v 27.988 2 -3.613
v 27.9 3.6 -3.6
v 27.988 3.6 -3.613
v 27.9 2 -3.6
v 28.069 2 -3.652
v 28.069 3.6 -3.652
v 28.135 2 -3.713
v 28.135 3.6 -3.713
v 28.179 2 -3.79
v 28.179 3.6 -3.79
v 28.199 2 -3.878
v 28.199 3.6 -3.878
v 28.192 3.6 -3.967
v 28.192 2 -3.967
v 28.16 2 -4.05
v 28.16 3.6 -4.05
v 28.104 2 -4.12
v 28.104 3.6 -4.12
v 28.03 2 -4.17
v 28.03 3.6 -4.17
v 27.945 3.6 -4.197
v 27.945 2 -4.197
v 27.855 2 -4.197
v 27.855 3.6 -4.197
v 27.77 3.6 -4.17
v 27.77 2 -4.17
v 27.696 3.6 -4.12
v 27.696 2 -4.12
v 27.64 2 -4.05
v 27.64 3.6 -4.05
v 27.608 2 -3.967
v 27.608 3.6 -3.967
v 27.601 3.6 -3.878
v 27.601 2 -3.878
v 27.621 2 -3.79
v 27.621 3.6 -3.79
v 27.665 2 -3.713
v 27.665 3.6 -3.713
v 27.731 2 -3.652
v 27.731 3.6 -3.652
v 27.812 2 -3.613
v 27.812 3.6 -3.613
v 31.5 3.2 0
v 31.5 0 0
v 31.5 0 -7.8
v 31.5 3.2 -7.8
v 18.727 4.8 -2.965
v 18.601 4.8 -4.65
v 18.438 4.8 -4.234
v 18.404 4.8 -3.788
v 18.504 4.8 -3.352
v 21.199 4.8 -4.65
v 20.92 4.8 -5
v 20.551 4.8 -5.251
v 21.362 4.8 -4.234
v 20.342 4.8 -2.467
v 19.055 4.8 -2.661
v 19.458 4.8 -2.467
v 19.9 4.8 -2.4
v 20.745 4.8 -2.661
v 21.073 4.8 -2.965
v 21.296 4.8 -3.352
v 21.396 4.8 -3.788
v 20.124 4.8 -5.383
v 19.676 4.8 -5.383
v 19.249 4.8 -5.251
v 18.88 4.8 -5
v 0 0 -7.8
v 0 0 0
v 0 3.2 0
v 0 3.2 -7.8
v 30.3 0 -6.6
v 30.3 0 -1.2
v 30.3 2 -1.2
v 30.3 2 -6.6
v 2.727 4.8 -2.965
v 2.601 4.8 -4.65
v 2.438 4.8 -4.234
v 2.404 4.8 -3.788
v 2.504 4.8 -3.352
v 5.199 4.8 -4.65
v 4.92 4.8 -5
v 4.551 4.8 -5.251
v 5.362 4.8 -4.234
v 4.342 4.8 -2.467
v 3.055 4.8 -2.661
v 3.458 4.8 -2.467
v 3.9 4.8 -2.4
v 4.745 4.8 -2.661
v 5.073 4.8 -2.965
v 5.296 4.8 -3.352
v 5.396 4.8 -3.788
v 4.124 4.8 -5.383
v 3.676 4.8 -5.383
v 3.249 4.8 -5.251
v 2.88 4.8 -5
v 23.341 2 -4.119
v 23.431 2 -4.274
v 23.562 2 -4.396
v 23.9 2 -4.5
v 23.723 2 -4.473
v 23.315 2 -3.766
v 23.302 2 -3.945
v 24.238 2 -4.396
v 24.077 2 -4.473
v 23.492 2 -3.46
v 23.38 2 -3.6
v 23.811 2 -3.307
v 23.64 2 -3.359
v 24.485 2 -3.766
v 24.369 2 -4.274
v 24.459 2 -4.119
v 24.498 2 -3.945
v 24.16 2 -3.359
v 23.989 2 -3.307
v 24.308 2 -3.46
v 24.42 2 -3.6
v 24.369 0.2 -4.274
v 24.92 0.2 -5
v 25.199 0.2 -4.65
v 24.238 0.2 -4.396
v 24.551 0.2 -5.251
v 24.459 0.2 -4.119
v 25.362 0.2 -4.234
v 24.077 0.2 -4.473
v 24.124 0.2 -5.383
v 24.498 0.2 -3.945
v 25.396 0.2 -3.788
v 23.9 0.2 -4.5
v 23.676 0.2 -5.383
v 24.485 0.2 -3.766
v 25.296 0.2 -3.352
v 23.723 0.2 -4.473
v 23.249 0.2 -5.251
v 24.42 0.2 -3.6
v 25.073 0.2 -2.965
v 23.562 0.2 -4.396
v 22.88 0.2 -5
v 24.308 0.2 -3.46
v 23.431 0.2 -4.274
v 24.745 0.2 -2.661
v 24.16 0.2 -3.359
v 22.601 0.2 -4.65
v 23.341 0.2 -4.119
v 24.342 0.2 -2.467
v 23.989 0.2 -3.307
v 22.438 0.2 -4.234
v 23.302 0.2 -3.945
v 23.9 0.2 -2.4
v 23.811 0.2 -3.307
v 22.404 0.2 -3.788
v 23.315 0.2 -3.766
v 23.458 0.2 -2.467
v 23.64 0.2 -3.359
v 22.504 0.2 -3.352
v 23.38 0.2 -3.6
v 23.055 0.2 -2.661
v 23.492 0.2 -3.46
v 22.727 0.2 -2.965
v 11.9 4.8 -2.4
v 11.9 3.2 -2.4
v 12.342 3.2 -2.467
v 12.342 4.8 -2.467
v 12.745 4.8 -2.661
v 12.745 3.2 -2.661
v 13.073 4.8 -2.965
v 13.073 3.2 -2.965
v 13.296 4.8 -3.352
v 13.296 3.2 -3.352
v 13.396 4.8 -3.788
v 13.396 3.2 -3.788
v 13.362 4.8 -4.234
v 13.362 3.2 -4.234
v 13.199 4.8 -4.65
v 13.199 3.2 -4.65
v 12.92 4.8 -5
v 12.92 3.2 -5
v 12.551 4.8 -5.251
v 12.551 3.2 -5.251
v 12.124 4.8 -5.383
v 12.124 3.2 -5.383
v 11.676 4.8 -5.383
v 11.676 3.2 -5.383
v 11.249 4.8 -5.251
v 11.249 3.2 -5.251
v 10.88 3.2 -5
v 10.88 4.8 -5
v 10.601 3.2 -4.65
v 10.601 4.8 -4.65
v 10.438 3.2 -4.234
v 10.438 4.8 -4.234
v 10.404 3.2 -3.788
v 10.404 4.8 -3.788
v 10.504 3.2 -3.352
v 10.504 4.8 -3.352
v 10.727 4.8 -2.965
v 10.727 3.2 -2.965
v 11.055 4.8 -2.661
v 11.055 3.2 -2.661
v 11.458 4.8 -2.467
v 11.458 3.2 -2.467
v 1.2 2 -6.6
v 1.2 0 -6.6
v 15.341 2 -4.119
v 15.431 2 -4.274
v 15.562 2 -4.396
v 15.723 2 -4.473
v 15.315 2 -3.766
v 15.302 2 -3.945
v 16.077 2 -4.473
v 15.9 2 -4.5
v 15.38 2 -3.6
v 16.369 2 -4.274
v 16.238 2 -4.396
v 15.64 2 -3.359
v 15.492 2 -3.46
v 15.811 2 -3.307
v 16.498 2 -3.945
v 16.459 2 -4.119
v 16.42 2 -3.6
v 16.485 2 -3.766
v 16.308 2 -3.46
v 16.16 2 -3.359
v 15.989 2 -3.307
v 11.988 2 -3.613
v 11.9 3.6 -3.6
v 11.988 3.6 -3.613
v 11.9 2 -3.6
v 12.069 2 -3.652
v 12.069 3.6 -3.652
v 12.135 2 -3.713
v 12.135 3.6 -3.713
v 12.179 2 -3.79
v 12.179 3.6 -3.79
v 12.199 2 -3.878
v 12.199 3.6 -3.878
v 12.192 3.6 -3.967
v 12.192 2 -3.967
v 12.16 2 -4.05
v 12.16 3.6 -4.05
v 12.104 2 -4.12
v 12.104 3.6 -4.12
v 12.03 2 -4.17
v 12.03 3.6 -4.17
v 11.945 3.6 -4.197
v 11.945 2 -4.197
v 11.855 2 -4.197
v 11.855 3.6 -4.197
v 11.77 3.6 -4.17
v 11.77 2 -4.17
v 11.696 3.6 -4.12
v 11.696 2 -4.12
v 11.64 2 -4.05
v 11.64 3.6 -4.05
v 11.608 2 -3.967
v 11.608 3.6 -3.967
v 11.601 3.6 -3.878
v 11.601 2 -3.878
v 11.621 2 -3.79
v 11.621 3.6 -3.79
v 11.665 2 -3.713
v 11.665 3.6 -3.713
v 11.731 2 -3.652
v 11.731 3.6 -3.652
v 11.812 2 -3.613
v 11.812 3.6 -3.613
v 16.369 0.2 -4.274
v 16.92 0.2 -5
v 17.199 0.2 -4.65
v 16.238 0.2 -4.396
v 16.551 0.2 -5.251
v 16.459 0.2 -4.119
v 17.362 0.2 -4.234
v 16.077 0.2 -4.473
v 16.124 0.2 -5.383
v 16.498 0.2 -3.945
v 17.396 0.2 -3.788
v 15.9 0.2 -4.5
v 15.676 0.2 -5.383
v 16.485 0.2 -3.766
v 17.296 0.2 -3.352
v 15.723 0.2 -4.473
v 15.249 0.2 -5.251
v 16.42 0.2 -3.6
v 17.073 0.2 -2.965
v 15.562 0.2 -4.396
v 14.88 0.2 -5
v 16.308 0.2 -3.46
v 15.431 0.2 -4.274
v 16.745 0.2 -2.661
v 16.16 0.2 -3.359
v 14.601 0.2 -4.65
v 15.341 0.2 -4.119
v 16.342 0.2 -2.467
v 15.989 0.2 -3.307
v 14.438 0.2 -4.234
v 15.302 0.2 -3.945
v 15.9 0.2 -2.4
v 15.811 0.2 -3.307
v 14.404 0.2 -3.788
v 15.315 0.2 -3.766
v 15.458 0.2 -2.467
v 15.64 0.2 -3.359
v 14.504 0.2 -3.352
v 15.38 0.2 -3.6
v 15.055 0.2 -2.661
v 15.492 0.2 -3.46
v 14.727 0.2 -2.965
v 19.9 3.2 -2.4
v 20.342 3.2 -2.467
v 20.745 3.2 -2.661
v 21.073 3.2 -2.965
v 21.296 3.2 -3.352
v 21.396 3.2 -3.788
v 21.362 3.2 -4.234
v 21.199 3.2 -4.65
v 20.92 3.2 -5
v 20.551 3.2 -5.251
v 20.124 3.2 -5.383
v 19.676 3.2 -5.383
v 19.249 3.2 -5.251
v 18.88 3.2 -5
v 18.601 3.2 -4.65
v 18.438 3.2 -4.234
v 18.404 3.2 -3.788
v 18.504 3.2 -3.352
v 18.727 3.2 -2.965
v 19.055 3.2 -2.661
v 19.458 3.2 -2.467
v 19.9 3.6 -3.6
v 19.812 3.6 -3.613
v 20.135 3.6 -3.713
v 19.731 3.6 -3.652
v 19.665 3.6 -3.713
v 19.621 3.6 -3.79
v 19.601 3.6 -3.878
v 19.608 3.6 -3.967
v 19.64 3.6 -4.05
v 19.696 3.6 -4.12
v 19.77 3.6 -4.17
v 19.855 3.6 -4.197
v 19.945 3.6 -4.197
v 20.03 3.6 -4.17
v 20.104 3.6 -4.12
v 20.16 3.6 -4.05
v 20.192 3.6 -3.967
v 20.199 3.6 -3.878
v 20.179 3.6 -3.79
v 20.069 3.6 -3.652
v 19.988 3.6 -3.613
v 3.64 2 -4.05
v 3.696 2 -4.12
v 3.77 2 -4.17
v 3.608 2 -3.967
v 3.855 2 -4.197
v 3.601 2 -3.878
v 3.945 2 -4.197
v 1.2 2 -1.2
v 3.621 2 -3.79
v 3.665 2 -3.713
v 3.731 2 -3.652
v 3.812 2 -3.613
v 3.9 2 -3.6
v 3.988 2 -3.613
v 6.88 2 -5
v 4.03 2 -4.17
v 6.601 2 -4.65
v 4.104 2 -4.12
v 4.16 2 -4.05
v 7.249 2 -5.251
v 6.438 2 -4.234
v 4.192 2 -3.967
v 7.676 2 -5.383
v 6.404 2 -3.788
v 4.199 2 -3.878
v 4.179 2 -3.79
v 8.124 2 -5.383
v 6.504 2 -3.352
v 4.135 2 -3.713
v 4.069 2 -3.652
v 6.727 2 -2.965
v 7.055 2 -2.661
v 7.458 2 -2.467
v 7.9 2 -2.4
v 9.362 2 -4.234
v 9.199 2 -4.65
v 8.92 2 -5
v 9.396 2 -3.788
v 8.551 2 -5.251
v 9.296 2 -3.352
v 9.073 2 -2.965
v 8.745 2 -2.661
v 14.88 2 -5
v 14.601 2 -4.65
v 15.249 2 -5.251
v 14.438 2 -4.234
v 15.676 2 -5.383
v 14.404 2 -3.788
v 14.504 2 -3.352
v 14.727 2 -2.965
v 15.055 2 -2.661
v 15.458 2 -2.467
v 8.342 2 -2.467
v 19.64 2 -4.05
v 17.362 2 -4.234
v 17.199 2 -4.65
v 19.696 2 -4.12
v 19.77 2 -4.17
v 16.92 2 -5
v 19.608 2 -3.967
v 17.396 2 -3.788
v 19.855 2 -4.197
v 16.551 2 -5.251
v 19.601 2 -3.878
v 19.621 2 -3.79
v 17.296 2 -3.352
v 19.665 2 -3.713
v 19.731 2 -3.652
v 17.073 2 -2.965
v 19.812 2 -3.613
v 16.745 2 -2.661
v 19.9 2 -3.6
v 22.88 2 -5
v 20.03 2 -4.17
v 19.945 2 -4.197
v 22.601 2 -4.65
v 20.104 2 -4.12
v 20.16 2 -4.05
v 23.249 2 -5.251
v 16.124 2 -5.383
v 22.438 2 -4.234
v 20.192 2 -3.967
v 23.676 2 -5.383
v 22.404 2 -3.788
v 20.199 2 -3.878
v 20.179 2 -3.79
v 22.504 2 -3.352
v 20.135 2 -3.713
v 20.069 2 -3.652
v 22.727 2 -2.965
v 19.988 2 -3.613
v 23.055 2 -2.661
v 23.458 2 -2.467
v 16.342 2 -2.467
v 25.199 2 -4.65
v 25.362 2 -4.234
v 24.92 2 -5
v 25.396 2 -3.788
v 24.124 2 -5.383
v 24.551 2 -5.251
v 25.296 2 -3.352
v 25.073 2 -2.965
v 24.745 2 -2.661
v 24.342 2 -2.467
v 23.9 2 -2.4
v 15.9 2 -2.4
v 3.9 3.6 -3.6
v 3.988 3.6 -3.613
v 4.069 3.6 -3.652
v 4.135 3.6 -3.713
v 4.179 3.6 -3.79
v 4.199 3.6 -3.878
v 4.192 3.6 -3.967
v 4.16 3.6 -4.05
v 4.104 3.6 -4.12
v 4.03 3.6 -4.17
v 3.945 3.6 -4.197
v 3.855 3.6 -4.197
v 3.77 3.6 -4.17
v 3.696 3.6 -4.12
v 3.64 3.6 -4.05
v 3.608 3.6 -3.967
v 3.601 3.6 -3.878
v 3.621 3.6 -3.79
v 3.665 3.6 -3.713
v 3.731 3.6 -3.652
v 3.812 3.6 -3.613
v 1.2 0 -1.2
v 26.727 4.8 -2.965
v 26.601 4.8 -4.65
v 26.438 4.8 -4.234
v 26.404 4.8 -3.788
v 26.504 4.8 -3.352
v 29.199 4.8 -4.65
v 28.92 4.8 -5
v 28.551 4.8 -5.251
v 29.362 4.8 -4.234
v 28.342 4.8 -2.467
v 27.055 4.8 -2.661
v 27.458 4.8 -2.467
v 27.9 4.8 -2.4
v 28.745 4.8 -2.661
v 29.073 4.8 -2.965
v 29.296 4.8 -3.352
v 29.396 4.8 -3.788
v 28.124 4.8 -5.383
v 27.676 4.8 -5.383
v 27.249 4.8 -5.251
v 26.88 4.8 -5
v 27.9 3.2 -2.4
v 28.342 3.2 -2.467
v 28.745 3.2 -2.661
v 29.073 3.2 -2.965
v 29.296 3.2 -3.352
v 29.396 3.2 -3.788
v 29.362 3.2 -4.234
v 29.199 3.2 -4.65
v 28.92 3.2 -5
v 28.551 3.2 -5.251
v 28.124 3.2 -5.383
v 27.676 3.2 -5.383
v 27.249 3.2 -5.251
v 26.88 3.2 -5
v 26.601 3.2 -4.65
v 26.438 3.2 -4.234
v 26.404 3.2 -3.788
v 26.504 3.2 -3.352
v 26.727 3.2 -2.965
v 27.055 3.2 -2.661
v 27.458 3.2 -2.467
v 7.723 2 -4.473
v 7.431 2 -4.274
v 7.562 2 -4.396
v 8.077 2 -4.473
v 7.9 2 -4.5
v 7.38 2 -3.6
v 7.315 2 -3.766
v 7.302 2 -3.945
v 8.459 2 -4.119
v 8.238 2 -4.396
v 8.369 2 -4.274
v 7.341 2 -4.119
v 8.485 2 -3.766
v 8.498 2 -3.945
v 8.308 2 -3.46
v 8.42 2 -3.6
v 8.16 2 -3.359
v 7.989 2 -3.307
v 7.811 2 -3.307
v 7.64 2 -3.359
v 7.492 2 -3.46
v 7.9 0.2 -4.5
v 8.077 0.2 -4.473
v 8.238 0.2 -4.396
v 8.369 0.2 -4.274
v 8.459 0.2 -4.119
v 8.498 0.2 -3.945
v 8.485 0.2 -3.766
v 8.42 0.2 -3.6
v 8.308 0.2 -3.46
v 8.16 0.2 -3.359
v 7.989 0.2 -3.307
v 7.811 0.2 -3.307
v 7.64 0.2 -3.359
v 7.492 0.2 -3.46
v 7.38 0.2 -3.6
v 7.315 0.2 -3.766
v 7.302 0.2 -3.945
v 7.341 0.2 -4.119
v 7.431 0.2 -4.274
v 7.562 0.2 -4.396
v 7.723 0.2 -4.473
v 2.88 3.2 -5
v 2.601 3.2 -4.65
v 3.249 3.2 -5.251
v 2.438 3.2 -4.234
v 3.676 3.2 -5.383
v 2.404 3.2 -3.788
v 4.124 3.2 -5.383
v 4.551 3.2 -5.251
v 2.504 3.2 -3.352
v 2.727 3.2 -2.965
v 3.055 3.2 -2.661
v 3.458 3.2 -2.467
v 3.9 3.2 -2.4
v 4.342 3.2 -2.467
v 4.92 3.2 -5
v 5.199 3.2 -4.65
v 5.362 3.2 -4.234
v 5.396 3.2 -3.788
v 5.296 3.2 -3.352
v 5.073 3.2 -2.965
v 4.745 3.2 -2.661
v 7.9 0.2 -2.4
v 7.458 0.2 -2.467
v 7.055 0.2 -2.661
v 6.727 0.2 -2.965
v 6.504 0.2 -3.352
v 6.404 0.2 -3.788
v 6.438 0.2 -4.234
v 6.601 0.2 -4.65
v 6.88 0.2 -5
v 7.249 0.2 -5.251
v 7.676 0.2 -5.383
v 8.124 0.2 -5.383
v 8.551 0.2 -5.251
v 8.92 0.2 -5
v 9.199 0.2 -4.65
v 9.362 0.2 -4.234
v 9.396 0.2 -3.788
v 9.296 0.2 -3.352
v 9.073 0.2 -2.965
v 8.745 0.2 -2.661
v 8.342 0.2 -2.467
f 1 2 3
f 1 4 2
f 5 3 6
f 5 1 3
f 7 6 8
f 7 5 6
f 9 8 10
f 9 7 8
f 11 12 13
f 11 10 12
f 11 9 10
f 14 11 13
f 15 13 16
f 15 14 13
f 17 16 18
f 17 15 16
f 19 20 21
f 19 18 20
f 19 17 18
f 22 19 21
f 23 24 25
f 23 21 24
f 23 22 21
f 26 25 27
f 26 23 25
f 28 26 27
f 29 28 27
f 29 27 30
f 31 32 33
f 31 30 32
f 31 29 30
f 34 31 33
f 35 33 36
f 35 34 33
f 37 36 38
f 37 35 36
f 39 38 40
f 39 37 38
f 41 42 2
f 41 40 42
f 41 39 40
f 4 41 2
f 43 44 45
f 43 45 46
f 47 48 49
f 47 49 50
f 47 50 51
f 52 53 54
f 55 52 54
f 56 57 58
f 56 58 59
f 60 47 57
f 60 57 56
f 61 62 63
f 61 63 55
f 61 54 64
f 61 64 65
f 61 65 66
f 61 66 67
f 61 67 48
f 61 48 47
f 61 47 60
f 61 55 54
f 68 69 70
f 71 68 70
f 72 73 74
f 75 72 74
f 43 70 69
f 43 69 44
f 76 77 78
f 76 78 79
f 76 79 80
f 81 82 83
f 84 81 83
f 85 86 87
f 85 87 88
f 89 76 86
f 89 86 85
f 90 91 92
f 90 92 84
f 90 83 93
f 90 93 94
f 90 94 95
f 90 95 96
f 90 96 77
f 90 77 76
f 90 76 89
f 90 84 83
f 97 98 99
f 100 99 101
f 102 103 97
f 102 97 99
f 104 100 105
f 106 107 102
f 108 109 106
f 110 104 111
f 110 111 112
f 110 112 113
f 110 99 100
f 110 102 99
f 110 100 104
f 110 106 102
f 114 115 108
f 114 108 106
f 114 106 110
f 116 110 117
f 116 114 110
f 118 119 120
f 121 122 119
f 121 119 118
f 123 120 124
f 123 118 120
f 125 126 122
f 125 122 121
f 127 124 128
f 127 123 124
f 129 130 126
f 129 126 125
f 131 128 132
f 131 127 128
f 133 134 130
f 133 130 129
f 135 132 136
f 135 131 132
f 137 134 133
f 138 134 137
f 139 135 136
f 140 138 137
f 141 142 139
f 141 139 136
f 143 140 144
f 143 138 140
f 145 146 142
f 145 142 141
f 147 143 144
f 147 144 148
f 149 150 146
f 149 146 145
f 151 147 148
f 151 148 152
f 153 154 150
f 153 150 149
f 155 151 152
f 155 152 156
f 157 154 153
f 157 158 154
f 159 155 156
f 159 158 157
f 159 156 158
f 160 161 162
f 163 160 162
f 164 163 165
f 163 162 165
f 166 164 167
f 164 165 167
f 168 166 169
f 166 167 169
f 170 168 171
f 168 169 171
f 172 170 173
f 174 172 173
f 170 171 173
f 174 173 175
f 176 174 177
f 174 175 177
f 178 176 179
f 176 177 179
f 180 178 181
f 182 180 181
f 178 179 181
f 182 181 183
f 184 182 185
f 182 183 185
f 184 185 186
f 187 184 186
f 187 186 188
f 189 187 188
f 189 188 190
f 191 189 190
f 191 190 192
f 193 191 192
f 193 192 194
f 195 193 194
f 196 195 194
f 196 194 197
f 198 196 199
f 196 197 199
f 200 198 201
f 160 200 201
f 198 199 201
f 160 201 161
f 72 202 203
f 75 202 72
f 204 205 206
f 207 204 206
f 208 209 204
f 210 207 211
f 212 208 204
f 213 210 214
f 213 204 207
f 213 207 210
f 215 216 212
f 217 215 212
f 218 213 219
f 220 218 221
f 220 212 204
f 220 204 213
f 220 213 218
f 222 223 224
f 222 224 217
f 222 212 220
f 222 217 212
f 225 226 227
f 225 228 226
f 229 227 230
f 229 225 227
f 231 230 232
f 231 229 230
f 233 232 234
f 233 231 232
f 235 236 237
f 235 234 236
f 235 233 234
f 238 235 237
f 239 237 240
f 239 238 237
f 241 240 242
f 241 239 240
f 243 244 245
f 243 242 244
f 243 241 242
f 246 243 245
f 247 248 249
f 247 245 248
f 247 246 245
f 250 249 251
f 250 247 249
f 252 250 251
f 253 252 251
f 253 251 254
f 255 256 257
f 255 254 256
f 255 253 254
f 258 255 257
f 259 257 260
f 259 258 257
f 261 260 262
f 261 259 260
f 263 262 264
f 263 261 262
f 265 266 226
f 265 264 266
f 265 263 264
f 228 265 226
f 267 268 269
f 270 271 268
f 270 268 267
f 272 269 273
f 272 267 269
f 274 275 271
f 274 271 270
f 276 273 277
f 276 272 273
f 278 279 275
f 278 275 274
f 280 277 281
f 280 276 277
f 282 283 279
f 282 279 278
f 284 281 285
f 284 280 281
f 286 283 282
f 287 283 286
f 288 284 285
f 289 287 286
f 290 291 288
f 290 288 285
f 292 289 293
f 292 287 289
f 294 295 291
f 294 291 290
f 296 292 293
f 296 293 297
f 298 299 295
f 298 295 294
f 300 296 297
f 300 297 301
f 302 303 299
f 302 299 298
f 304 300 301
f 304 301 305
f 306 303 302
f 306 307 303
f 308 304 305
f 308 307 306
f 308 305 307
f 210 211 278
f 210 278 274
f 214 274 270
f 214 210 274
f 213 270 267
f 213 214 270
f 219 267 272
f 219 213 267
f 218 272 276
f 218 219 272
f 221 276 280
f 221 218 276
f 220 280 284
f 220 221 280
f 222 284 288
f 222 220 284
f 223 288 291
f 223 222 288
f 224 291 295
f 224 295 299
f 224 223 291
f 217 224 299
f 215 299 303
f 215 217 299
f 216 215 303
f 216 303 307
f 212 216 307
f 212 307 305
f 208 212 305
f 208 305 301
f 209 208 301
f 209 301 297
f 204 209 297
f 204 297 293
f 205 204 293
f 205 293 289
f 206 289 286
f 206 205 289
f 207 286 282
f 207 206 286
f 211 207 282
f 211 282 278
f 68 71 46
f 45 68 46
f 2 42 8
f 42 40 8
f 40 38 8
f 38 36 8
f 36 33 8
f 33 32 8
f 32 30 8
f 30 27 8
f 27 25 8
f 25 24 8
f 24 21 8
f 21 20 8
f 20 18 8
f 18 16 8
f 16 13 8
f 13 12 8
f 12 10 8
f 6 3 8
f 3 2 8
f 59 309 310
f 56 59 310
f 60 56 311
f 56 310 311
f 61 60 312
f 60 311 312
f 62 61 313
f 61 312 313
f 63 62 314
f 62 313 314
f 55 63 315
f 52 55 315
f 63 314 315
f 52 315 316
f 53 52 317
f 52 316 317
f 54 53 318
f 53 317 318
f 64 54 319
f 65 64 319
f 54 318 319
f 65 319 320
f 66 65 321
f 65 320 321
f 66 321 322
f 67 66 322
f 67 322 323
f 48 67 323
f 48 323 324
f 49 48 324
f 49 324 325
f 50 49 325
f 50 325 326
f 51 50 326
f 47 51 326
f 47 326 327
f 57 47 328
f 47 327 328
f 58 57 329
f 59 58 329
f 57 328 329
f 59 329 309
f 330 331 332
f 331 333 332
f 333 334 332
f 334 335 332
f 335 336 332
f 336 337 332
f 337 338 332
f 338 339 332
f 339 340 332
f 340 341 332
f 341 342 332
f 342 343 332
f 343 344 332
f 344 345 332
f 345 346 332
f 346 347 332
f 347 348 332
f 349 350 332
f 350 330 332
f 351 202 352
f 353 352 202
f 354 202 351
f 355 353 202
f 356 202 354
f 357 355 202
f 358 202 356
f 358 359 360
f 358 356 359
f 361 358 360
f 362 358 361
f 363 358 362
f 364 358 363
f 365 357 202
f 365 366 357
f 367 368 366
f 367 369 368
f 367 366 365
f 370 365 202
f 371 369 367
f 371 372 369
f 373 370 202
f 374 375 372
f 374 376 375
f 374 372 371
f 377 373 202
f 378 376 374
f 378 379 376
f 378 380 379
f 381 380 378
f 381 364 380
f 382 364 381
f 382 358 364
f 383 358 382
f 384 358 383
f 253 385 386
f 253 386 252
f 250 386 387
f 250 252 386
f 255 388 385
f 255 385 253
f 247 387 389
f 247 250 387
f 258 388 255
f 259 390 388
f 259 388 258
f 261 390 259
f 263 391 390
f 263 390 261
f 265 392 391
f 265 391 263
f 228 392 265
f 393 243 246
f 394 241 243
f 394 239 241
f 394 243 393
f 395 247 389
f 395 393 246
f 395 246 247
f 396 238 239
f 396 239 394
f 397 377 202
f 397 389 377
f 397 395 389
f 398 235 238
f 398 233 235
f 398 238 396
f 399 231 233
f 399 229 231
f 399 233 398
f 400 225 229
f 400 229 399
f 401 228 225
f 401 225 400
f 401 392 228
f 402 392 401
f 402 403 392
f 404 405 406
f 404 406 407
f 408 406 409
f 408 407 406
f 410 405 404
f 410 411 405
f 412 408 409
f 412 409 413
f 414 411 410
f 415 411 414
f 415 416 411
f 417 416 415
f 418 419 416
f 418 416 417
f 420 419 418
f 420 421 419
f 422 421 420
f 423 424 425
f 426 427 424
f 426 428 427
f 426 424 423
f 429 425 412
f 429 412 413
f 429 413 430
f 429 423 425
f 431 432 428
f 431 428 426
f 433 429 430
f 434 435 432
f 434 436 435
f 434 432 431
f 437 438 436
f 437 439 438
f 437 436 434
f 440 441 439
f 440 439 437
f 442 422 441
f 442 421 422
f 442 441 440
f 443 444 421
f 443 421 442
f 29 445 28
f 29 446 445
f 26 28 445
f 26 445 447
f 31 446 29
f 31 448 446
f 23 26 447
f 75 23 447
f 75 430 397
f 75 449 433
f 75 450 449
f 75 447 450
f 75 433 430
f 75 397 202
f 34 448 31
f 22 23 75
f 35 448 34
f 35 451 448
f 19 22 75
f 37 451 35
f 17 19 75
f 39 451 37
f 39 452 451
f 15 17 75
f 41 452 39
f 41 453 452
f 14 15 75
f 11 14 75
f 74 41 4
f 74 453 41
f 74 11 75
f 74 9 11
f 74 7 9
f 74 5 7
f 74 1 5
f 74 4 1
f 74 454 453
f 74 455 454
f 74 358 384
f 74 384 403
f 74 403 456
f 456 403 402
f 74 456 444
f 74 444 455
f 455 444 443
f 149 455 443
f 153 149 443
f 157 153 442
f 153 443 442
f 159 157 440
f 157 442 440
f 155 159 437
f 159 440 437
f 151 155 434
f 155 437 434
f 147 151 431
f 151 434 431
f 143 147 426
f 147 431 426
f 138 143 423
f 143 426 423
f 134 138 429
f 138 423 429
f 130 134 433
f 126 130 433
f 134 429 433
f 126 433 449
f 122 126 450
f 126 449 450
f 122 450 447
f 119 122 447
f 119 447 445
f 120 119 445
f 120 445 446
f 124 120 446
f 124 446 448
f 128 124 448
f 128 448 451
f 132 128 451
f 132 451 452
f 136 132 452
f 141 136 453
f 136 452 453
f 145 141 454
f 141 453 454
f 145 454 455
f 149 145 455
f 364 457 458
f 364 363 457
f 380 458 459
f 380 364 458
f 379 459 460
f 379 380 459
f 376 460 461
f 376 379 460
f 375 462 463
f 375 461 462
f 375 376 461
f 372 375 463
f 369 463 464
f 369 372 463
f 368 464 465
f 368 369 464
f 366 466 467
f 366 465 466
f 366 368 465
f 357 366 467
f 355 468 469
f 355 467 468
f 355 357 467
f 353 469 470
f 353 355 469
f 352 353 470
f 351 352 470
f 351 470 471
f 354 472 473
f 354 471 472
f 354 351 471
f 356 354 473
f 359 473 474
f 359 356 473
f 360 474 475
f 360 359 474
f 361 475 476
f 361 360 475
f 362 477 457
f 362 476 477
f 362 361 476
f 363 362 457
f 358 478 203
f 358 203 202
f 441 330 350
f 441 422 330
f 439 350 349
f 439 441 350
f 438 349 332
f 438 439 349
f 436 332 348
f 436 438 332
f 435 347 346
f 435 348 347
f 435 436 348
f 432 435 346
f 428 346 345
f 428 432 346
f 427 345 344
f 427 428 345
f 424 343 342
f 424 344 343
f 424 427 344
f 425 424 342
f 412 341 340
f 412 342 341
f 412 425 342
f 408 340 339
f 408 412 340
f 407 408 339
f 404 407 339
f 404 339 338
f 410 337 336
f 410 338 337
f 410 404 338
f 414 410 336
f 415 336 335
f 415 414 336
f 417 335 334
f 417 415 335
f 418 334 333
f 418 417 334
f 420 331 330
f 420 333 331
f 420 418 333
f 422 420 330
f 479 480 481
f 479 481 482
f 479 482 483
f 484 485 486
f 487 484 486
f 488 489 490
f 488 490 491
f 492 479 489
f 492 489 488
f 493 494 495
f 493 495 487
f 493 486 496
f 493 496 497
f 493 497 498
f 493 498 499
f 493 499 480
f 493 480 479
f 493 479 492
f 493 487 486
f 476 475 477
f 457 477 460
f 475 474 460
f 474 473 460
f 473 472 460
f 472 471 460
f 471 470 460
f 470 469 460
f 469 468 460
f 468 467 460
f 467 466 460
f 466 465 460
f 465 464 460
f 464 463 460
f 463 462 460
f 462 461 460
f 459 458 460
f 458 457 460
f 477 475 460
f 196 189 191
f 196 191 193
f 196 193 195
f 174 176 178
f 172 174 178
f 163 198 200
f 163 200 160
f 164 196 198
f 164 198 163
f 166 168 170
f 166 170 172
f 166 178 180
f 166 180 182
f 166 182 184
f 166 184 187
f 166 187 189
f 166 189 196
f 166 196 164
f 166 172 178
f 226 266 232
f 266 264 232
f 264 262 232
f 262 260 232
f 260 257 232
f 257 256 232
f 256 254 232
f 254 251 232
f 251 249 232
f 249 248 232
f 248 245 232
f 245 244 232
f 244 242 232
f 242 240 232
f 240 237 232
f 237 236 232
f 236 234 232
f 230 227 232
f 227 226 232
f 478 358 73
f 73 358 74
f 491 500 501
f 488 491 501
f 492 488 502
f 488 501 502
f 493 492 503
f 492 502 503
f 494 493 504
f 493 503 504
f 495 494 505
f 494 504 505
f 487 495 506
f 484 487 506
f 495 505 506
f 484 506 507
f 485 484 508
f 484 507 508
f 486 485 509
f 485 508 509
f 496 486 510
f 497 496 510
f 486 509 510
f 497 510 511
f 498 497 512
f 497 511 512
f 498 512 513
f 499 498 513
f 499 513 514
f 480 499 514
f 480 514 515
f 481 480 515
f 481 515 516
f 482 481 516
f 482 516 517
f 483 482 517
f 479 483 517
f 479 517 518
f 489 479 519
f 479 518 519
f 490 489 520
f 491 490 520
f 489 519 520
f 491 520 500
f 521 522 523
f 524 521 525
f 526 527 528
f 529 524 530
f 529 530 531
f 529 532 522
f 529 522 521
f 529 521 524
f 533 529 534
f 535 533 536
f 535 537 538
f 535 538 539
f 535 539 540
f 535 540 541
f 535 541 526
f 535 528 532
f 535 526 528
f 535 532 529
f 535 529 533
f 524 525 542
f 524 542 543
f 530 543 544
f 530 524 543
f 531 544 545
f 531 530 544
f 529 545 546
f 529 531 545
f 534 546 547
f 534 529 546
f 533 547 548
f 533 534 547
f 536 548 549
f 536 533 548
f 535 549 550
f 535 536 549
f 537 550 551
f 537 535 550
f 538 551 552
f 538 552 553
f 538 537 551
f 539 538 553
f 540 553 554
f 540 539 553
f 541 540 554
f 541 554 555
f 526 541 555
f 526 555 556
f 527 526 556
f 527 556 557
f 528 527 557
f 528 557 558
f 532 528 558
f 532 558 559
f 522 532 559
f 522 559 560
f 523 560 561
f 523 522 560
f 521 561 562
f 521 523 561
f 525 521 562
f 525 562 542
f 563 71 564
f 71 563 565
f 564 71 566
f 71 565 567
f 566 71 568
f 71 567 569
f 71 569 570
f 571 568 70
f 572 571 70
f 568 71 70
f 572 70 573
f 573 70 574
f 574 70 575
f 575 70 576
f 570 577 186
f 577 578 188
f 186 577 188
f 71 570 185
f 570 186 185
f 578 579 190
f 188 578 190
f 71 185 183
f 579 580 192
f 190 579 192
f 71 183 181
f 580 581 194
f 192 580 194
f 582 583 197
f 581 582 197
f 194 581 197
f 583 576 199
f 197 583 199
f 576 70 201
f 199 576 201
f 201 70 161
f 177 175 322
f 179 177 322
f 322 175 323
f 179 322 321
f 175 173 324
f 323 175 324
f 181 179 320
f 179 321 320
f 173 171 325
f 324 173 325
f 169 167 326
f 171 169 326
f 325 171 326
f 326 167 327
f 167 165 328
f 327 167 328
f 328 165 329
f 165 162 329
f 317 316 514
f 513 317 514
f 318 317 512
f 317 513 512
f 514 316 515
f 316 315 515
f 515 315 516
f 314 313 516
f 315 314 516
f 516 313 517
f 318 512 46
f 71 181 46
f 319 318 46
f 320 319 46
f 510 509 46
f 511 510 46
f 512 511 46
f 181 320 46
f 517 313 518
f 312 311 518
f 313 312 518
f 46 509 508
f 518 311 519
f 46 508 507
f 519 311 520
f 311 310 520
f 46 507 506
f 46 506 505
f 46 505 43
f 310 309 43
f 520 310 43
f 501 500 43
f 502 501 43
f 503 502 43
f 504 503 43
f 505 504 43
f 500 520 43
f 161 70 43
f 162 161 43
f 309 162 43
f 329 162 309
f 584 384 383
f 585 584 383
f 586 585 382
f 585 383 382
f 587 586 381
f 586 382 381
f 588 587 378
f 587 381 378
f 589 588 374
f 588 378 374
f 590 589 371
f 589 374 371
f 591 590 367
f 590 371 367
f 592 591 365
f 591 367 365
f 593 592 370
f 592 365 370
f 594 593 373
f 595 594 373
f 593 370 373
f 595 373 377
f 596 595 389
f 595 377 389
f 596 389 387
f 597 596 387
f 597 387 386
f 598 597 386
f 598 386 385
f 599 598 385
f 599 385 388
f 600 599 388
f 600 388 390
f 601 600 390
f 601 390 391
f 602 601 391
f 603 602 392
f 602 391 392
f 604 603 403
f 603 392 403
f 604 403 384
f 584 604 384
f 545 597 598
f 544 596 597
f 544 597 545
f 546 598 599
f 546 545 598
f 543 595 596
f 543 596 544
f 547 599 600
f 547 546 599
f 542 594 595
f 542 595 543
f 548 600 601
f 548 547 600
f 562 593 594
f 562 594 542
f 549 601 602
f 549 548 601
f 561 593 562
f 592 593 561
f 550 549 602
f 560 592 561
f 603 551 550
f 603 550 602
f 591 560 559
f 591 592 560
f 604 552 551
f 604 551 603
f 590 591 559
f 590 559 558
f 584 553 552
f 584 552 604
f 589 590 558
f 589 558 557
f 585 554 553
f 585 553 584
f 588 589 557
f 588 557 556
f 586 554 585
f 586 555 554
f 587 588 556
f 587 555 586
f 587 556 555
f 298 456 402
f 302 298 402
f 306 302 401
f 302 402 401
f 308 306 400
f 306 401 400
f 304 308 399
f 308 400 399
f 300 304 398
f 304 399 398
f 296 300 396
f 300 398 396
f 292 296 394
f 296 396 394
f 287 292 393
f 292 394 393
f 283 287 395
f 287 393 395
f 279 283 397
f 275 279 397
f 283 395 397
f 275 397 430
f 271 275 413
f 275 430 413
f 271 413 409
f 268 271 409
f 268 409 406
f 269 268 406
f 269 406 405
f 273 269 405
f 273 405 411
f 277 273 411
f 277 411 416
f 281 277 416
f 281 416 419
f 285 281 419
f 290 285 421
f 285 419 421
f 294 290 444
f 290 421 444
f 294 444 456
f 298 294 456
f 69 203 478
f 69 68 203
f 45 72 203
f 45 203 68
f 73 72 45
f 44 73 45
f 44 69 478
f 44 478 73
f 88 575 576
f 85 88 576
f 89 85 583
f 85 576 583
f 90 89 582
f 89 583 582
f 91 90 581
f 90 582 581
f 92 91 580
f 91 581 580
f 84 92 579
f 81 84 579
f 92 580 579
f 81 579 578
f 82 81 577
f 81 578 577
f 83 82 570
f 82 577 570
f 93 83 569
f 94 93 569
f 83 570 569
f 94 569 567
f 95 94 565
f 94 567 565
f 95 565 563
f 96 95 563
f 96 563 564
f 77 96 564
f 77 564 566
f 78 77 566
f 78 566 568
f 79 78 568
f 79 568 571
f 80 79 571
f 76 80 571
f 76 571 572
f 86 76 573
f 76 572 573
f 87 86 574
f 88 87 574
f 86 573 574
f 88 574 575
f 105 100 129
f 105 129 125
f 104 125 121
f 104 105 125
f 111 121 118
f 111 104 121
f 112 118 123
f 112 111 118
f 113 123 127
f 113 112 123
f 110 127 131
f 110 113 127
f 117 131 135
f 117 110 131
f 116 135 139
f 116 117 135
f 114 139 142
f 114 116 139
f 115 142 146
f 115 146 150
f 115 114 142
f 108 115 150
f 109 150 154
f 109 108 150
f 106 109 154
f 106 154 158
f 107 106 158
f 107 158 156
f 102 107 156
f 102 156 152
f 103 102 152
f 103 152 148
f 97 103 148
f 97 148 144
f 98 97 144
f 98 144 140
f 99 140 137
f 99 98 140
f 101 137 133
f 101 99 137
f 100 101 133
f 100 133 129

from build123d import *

# Parameters (mm, degrees)
SKETCH1_W            = 31.5
SKETCH1_H            = 3.2
BOSS_EXTRUDE1_DEPTH  = 7.8
SKETCH2_R            = 1.5
BOSS_EXTRUDE2_DEPTH  = 1.6
LPATTERN1_COUNT      = 2
LPATTERN1_PITCH      = 8
LPATTERN1_COUNT_DIR2 = 4
LPATTERN1_PITCH_DIR2 = 8
SHELL1_T             = -1.2
SKETCH3_R            = 1.5
SKETCH3_R_2          = 0.6
BOSS_EXTRUDE3_DEPTH  = 1.8
LPATTERN2_COUNT      = 3
LPATTERN2_PITCH      = 8


with BuildPart() as part:
    # Sketch1 → Boss-Extrude1 (new body)
    with BuildSketch(Plane.XY):
        with Locations((15.75, 1.6)):
            Rectangle(SKETCH1_W, SKETCH1_H)
    extrude(amount=-BOSS_EXTRUDE1_DEPTH)

    # Sketch2 → Boss-Extrude2 (add)
    with BuildSketch(Plane(origin=(0, 3.2, 0), x_dir=(1, 0, 0), z_dir=(0, 1, 0))):
        with Locations(Location((3.9, 3.9, 0), (0, 0, 270))):
            Circle(SKETCH2_R)
    boss_extrude2 = extrude(amount=BOSS_EXTRUDE2_DEPTH)

    # LPattern1: Boss-Extrude2 2 × 4, 4 skipped
    with Locations(*[(j * LPATTERN1_PITCH_DIR2, 0, i * LPATTERN1_PITCH) for i in range(LPATTERN1_COUNT) for j in range(LPATTERN1_COUNT_DIR2) if (i, j) not in ((0, 0), (1, 0), (1, 1), (1, 2), (1, 3))]):
        add(boss_extrude2)

    # Shell1
    shell1_openings = [part.faces().sort_by_distance(p)[0] for p in [
        (15.75, 0, -3.9),
    ]]
    offset(amount=SHELL1_T, openings=shell1_openings, kind=Kind.INTERSECTION)

    # Sketch3 → Boss-Extrude3 (add)
    with BuildSketch(Plane.XZ.offset(-2)):
        with Locations(Location((7.9, -3.9, 0), (0, 0, 90))):
            Circle(SKETCH3_R)
        with Locations(Location((7.9, -3.9, 0), (0, 0, 270))):
            Circle(SKETCH3_R_2, mode=Mode.SUBTRACT)
    boss_extrude3 = extrude(amount=BOSS_EXTRUDE3_DEPTH)

    # LPattern2: Boss-Extrude3 ×3
    with Locations(*[(i * LPATTERN2_PITCH, 0, 0) for i in range(1, LPATTERN2_COUNT)]):
        add(boss_extrude3)


solid = part.part
